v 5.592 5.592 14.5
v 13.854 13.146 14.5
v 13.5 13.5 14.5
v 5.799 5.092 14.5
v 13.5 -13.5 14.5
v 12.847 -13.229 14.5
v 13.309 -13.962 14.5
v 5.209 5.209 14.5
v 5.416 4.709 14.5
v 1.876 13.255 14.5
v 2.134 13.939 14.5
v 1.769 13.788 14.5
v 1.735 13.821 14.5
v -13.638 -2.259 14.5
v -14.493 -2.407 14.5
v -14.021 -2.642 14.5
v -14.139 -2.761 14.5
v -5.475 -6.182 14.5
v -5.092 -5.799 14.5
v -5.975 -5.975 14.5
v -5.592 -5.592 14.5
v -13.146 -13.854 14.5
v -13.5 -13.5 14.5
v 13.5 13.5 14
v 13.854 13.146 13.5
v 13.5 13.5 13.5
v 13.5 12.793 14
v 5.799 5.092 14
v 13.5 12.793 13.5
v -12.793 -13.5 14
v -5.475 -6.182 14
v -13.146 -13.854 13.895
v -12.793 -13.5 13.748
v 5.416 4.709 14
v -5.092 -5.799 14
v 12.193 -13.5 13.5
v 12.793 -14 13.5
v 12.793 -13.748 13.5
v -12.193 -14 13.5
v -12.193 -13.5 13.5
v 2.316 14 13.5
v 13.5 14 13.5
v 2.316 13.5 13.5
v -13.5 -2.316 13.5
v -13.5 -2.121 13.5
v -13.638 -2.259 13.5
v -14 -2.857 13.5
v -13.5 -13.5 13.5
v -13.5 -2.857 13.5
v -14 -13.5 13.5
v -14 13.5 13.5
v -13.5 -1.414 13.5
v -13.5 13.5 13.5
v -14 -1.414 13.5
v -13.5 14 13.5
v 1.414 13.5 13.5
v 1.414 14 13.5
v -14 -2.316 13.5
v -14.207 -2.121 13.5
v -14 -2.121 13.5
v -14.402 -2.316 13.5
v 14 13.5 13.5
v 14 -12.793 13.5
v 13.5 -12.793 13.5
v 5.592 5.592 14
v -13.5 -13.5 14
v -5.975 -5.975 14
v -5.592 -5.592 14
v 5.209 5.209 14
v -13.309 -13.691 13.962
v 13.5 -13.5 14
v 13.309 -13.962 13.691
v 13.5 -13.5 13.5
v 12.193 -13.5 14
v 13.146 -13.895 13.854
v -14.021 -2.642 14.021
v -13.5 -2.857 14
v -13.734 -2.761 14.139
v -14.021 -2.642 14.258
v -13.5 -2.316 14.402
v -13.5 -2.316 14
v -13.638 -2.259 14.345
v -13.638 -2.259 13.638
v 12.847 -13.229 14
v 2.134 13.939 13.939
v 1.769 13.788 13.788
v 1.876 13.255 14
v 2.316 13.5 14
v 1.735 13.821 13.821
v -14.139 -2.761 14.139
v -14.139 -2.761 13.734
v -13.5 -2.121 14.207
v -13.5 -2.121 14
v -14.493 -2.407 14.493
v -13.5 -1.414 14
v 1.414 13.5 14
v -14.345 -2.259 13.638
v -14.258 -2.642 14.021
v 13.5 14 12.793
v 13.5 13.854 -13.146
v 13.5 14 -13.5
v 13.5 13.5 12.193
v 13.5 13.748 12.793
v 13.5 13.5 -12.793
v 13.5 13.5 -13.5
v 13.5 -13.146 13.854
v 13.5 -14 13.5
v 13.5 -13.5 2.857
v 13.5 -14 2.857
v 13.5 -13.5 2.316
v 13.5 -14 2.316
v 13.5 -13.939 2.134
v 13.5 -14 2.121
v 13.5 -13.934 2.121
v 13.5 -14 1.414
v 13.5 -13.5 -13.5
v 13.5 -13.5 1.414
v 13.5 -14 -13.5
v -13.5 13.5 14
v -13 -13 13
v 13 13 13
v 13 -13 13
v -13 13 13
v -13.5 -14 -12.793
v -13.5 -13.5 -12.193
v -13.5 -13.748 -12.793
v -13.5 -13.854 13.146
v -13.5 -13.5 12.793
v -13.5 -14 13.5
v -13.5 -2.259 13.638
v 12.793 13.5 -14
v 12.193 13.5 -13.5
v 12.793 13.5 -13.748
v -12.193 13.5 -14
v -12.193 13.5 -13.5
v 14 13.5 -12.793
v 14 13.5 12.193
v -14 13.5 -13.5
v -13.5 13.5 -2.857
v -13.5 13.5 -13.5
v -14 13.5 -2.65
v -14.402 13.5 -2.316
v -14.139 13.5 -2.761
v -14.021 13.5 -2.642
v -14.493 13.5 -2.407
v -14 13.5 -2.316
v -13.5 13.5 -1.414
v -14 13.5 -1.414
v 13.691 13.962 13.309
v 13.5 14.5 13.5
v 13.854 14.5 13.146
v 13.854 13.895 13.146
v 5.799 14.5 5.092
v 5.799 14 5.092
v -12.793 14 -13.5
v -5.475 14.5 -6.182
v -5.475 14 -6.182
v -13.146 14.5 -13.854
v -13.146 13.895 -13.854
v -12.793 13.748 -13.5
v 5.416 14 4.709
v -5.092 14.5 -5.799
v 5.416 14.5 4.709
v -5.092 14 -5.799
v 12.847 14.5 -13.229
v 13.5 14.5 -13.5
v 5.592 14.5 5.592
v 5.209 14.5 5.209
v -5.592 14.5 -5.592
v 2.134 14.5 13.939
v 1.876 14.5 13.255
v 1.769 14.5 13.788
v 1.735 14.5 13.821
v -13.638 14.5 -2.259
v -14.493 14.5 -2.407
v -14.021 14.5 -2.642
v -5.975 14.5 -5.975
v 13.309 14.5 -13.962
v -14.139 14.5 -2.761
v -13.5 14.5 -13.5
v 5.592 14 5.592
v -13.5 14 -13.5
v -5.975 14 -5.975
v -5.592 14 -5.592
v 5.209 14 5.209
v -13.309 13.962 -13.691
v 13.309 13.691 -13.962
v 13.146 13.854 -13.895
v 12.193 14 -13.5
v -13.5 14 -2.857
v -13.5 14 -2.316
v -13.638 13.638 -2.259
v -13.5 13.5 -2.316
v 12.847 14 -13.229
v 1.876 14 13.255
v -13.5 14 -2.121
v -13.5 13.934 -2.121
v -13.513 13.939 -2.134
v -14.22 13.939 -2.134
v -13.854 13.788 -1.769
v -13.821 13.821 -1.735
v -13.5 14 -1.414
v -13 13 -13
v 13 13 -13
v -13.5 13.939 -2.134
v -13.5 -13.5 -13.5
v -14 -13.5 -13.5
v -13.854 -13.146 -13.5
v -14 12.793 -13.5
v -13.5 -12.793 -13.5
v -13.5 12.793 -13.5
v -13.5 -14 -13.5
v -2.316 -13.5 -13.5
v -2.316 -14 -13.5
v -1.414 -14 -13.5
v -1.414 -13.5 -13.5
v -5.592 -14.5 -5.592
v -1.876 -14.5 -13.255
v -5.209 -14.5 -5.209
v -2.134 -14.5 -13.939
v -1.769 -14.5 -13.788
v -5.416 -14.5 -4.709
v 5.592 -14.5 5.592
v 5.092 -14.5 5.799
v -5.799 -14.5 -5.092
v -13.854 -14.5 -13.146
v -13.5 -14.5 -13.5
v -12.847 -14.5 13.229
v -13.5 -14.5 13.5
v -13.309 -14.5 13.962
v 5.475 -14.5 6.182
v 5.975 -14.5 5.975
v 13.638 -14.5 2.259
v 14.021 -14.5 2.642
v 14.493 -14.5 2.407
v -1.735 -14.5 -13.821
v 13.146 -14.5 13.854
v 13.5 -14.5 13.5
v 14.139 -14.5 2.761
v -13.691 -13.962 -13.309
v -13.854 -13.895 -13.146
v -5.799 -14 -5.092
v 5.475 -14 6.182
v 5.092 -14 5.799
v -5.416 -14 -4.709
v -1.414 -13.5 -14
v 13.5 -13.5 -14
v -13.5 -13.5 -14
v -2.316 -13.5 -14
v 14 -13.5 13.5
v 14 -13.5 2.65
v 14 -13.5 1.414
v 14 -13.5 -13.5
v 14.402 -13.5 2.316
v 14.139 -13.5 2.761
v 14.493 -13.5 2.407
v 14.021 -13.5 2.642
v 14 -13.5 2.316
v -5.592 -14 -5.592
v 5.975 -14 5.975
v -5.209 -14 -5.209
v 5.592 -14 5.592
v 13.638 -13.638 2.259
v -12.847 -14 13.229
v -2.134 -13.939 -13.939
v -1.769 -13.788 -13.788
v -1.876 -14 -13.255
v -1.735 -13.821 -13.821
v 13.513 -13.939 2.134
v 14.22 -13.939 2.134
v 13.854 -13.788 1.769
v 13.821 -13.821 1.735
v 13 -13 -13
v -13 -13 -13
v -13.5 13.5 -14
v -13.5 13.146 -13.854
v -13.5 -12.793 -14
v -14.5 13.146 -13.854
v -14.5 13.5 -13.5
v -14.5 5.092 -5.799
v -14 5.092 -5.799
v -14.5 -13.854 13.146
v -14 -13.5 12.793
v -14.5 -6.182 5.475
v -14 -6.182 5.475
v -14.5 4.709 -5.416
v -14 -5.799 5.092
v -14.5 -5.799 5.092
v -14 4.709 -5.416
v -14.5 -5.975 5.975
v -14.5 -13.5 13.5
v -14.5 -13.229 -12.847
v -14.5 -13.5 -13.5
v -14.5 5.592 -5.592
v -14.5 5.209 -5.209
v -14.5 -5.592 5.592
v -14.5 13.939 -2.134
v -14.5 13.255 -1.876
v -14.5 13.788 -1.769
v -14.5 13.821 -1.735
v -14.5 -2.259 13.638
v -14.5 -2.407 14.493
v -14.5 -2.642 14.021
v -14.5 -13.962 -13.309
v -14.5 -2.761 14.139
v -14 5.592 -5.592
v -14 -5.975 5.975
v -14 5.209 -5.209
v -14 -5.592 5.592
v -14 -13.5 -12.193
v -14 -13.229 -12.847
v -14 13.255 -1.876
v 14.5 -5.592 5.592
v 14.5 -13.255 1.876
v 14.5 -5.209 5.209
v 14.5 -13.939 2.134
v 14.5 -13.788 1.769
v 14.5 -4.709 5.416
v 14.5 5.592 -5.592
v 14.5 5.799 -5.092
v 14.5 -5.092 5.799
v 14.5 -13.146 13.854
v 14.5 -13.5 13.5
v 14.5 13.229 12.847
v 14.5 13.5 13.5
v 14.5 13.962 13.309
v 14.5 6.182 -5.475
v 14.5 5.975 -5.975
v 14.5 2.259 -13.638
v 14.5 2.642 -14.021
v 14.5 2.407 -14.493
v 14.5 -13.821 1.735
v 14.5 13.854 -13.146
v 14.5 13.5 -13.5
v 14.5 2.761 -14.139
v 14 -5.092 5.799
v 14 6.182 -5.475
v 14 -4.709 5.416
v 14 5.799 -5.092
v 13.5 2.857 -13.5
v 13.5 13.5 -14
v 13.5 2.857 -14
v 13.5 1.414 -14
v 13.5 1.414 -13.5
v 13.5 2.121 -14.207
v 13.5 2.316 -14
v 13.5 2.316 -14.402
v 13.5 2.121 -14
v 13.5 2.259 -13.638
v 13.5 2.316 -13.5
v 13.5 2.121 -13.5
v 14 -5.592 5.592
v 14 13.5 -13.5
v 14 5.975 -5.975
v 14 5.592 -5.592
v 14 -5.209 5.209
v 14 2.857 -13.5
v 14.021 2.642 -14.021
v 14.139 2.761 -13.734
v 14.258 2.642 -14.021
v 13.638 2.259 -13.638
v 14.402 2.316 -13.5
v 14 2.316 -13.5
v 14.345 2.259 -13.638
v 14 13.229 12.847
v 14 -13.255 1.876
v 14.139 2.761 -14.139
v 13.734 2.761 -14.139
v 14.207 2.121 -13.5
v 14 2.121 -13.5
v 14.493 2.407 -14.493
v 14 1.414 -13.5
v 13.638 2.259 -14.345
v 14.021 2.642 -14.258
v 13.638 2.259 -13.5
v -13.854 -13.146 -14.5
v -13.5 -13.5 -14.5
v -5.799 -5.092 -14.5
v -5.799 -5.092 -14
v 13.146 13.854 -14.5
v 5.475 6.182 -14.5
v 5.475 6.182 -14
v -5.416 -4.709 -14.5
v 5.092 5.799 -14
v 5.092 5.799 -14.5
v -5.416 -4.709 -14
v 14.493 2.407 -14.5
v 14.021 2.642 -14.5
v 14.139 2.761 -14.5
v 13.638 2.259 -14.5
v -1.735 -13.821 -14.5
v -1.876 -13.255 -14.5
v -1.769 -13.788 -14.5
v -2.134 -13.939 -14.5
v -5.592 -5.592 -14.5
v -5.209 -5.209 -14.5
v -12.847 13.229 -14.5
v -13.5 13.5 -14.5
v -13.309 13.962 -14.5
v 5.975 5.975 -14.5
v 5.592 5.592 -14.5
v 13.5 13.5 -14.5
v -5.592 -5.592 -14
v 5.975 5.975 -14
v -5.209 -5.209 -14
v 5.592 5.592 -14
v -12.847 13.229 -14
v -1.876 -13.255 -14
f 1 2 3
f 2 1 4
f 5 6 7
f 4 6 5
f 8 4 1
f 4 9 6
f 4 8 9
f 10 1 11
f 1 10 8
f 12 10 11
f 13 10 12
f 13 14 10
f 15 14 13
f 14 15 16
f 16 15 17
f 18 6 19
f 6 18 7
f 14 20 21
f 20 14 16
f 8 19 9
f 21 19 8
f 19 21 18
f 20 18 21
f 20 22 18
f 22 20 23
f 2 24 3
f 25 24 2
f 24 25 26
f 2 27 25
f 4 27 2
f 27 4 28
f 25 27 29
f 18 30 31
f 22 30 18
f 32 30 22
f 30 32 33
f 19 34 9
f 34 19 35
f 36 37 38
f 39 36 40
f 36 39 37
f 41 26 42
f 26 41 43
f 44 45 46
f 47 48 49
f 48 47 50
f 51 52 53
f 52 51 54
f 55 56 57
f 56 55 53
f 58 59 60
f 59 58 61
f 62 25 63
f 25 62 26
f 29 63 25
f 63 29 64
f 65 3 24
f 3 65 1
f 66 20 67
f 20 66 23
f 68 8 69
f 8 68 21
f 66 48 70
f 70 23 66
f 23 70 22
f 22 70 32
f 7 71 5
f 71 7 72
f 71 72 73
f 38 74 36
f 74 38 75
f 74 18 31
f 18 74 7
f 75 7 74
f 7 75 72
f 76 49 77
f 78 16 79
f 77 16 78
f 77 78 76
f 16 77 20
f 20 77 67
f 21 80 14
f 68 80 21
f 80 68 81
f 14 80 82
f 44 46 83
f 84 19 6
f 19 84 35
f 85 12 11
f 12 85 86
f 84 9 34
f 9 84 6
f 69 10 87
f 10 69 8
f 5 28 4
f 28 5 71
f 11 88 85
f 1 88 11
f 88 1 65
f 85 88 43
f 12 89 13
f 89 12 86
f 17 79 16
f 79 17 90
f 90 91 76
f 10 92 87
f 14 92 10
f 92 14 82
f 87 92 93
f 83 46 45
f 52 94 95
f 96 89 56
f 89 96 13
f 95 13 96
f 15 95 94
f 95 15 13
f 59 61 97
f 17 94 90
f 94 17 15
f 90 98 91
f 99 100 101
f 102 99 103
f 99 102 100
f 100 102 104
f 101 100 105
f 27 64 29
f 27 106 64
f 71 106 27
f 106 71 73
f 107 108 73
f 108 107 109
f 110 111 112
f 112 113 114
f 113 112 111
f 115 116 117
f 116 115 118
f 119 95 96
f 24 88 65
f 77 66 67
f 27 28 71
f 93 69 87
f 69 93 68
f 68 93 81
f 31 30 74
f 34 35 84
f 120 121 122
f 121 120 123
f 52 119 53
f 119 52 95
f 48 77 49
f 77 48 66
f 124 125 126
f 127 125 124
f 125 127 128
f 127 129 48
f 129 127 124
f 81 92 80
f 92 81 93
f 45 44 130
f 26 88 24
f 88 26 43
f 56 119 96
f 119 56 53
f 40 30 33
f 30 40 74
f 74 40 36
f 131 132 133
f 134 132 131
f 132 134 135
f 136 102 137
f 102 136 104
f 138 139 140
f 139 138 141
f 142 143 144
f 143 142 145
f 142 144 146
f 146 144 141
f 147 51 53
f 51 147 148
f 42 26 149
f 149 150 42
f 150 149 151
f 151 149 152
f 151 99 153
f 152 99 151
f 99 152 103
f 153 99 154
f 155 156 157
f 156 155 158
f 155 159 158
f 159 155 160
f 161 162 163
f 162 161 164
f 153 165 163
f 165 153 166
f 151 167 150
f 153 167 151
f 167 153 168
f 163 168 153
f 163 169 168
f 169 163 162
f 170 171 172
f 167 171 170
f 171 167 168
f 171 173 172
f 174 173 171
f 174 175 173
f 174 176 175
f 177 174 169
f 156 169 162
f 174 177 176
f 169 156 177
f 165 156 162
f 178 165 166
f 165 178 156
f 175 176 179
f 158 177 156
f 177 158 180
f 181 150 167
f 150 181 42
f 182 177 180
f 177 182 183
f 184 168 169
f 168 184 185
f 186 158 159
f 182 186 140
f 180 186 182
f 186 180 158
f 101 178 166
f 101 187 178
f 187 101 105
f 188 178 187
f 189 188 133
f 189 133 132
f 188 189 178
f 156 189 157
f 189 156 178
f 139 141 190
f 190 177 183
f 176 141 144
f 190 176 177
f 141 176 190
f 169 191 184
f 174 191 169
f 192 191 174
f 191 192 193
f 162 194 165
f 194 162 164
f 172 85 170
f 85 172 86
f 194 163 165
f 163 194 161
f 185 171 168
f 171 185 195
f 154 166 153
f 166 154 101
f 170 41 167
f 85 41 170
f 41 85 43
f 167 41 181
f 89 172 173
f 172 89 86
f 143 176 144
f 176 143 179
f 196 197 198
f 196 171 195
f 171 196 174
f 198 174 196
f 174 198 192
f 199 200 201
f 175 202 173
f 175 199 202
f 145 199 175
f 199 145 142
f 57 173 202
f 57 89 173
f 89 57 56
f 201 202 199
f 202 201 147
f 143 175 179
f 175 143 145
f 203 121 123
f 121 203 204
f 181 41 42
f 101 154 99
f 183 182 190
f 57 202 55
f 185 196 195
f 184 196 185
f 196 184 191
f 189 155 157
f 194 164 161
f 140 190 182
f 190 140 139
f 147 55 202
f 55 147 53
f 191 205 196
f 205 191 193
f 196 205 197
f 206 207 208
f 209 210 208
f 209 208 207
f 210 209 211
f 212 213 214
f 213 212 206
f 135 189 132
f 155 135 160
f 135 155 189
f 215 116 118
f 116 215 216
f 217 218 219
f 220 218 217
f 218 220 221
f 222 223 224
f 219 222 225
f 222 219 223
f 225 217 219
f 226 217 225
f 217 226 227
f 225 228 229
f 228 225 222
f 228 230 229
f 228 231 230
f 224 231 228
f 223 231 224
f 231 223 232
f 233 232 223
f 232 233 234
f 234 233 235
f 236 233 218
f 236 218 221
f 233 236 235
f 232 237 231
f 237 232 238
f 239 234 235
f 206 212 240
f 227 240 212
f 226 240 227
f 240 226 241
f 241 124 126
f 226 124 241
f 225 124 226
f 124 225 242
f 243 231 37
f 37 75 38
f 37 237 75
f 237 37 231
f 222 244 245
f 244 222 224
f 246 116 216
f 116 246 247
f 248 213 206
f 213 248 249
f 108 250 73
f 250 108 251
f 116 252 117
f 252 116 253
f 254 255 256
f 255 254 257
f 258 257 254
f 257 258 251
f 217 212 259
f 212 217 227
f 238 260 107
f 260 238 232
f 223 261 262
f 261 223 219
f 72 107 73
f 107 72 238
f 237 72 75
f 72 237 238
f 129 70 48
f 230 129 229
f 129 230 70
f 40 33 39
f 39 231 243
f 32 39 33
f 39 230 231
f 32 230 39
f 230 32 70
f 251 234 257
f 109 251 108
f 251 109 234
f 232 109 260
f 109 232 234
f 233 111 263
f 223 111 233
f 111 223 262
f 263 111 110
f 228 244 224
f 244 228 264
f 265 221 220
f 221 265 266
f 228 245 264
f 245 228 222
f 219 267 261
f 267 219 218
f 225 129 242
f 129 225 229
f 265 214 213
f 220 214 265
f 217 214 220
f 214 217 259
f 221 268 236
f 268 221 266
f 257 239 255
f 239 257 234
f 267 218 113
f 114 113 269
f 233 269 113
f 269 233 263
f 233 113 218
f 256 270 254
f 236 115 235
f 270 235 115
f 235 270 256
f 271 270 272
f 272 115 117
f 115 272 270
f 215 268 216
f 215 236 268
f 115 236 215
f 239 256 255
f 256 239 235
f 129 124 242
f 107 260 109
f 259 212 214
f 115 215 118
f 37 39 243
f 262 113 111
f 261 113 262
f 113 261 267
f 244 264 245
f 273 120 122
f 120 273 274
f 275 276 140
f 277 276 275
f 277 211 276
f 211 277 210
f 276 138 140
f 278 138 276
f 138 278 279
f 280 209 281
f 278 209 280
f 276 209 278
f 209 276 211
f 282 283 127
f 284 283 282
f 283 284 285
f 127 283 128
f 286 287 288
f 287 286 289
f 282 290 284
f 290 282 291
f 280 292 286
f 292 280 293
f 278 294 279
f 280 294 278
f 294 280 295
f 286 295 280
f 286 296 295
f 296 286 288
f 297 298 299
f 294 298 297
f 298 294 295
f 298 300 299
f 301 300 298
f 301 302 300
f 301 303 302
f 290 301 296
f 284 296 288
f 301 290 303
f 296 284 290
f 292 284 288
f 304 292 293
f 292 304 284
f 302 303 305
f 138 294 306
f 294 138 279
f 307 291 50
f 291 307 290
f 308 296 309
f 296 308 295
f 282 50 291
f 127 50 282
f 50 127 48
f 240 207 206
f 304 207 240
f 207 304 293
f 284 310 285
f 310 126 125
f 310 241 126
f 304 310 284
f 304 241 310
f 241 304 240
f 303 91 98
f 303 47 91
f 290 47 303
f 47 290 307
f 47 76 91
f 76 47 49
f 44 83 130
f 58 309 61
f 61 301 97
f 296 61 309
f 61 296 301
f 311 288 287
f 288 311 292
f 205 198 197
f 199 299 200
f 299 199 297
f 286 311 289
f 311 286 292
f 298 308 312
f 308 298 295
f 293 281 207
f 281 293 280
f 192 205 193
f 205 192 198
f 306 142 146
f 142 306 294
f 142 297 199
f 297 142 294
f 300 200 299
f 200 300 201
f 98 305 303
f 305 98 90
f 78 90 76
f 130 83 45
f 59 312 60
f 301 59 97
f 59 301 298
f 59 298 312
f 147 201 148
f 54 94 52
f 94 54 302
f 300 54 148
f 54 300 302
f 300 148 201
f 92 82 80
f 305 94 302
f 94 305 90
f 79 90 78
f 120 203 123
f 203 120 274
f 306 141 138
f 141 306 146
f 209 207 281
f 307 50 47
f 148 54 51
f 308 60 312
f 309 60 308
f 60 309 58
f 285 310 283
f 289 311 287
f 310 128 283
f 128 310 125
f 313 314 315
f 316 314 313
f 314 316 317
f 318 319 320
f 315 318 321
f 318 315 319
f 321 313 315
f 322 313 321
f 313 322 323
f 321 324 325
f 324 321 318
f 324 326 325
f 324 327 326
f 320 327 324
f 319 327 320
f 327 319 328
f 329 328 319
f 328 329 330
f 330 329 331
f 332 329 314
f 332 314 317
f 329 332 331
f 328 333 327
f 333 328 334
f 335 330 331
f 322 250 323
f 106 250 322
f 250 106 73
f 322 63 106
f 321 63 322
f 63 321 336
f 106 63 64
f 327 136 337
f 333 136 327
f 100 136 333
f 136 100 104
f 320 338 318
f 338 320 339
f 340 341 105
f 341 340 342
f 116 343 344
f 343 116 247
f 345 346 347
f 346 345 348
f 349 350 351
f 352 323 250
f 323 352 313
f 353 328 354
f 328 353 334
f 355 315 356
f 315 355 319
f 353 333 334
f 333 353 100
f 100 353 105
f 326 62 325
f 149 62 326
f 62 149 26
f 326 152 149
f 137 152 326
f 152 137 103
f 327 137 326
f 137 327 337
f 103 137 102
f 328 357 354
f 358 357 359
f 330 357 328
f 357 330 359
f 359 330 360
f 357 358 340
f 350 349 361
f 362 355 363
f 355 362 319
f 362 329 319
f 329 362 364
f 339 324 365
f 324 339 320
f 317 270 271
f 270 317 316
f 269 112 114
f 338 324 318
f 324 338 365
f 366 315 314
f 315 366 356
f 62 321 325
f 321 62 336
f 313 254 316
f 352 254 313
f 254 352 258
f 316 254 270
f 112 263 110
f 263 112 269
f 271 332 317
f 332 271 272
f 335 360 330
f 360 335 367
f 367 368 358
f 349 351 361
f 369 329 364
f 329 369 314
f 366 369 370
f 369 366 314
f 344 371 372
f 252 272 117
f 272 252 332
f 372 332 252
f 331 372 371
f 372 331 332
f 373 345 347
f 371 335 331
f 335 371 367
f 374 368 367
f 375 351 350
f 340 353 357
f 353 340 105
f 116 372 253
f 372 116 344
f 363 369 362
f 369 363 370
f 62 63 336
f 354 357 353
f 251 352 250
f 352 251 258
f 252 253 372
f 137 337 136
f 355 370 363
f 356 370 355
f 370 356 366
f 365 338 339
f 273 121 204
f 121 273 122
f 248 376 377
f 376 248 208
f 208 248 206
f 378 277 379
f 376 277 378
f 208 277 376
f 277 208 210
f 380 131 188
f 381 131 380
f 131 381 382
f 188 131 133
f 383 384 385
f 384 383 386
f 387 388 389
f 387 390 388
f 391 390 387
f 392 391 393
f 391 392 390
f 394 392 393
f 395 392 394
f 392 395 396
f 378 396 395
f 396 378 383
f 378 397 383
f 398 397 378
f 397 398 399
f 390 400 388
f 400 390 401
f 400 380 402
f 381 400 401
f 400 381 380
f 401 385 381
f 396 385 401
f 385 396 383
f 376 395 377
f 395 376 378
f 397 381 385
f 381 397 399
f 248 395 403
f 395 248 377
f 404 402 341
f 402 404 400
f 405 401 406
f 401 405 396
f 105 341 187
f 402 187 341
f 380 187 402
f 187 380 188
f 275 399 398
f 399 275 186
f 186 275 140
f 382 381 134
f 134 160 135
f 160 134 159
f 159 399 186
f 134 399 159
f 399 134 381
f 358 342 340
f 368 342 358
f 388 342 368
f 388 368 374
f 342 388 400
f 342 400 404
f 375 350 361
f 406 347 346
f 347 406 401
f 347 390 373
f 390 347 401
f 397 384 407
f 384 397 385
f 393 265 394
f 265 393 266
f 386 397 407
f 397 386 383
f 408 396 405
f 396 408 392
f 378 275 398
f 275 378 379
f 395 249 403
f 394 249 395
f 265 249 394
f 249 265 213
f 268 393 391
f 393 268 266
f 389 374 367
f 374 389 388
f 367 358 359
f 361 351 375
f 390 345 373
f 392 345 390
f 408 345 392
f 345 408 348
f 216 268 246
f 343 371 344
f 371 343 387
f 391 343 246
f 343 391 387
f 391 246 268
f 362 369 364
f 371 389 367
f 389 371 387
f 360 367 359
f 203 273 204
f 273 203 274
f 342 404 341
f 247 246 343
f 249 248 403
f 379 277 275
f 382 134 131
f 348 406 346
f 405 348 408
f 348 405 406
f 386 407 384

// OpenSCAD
three=27;

module box() {
  translate([0, 0, three/2]) {
    color("blue") cube(size=[three, three, 1], center=true);
    rotate([0, 0, 90]) grid();
  }
  translate([0, three/2, 0])
  rotate([90, 0, 0]) {
    color("orange") cube(size=[three, three, 1], center=true);
    translate([0, 0, -1]) rotate([0, 0, 90]) grid();
  }
  translate([0, -three/2, 0])
  rotate([90, 0, 0]) {
    color("red") cube(size=[three, three, 1], center=true);
    rotate([0, 0, -90]) grid();
  }
  translate([-three/2, 0, 0])
  rotate([0, 90, 0]) {
    color("white") cube(size=[three, three, 1], center=true);
    translate([0, 0, -1]) rotate([0, 0, 90]) grid();
  }
  translate([three/2, 0, 0])
  rotate([0, 90, 0]) {
    color("yellow") cube(size=[three, three, 1], center=true);
    rotate([0, 0, -90]) grid();
  }
  translate([0, 0, -three/2]) {
    color("green") cube(size=[three, three, 1], center=true);
    translate([0, 0, -1]) rotate([0, 0, -90]) grid();
  }
}

module grid() {
  color("black")
  rotate([0, 0, 90])
  translate([-three/2, three/2, 0]) {
    ts2 = three*sqrt(2);
    rotate([0, 0, 45])
    translate([-ts2/2, -ts2/2, 0])
    cube([ts2, 0.5, 1]);

    rotate([0, 0, -45/2])
    cube([three*1.1, 0.5, 1]);

    rotate([0, 0, -(135/2)])
    cube([three*1.1, 0.5, 1]);

    rotate(45)
    translate([-three/3 -2, -ts2*(3/4) +1, 0])
    cube([three*0.85, 0.5, 1]);
  }
}

// rotate([45, 45, 0])
// rotate([90, 0, 0])
// rotate([90, 0, 0])
// rotate([90, 0, 0])
// rotate([0, 90, 0])
// rotate([0, 90, 0])
// rotate([0, 90, 0])
// rotate([0, 0, 90])
// rotate([0, 0, 90])
// rotate([0, 0, 90])
box();
